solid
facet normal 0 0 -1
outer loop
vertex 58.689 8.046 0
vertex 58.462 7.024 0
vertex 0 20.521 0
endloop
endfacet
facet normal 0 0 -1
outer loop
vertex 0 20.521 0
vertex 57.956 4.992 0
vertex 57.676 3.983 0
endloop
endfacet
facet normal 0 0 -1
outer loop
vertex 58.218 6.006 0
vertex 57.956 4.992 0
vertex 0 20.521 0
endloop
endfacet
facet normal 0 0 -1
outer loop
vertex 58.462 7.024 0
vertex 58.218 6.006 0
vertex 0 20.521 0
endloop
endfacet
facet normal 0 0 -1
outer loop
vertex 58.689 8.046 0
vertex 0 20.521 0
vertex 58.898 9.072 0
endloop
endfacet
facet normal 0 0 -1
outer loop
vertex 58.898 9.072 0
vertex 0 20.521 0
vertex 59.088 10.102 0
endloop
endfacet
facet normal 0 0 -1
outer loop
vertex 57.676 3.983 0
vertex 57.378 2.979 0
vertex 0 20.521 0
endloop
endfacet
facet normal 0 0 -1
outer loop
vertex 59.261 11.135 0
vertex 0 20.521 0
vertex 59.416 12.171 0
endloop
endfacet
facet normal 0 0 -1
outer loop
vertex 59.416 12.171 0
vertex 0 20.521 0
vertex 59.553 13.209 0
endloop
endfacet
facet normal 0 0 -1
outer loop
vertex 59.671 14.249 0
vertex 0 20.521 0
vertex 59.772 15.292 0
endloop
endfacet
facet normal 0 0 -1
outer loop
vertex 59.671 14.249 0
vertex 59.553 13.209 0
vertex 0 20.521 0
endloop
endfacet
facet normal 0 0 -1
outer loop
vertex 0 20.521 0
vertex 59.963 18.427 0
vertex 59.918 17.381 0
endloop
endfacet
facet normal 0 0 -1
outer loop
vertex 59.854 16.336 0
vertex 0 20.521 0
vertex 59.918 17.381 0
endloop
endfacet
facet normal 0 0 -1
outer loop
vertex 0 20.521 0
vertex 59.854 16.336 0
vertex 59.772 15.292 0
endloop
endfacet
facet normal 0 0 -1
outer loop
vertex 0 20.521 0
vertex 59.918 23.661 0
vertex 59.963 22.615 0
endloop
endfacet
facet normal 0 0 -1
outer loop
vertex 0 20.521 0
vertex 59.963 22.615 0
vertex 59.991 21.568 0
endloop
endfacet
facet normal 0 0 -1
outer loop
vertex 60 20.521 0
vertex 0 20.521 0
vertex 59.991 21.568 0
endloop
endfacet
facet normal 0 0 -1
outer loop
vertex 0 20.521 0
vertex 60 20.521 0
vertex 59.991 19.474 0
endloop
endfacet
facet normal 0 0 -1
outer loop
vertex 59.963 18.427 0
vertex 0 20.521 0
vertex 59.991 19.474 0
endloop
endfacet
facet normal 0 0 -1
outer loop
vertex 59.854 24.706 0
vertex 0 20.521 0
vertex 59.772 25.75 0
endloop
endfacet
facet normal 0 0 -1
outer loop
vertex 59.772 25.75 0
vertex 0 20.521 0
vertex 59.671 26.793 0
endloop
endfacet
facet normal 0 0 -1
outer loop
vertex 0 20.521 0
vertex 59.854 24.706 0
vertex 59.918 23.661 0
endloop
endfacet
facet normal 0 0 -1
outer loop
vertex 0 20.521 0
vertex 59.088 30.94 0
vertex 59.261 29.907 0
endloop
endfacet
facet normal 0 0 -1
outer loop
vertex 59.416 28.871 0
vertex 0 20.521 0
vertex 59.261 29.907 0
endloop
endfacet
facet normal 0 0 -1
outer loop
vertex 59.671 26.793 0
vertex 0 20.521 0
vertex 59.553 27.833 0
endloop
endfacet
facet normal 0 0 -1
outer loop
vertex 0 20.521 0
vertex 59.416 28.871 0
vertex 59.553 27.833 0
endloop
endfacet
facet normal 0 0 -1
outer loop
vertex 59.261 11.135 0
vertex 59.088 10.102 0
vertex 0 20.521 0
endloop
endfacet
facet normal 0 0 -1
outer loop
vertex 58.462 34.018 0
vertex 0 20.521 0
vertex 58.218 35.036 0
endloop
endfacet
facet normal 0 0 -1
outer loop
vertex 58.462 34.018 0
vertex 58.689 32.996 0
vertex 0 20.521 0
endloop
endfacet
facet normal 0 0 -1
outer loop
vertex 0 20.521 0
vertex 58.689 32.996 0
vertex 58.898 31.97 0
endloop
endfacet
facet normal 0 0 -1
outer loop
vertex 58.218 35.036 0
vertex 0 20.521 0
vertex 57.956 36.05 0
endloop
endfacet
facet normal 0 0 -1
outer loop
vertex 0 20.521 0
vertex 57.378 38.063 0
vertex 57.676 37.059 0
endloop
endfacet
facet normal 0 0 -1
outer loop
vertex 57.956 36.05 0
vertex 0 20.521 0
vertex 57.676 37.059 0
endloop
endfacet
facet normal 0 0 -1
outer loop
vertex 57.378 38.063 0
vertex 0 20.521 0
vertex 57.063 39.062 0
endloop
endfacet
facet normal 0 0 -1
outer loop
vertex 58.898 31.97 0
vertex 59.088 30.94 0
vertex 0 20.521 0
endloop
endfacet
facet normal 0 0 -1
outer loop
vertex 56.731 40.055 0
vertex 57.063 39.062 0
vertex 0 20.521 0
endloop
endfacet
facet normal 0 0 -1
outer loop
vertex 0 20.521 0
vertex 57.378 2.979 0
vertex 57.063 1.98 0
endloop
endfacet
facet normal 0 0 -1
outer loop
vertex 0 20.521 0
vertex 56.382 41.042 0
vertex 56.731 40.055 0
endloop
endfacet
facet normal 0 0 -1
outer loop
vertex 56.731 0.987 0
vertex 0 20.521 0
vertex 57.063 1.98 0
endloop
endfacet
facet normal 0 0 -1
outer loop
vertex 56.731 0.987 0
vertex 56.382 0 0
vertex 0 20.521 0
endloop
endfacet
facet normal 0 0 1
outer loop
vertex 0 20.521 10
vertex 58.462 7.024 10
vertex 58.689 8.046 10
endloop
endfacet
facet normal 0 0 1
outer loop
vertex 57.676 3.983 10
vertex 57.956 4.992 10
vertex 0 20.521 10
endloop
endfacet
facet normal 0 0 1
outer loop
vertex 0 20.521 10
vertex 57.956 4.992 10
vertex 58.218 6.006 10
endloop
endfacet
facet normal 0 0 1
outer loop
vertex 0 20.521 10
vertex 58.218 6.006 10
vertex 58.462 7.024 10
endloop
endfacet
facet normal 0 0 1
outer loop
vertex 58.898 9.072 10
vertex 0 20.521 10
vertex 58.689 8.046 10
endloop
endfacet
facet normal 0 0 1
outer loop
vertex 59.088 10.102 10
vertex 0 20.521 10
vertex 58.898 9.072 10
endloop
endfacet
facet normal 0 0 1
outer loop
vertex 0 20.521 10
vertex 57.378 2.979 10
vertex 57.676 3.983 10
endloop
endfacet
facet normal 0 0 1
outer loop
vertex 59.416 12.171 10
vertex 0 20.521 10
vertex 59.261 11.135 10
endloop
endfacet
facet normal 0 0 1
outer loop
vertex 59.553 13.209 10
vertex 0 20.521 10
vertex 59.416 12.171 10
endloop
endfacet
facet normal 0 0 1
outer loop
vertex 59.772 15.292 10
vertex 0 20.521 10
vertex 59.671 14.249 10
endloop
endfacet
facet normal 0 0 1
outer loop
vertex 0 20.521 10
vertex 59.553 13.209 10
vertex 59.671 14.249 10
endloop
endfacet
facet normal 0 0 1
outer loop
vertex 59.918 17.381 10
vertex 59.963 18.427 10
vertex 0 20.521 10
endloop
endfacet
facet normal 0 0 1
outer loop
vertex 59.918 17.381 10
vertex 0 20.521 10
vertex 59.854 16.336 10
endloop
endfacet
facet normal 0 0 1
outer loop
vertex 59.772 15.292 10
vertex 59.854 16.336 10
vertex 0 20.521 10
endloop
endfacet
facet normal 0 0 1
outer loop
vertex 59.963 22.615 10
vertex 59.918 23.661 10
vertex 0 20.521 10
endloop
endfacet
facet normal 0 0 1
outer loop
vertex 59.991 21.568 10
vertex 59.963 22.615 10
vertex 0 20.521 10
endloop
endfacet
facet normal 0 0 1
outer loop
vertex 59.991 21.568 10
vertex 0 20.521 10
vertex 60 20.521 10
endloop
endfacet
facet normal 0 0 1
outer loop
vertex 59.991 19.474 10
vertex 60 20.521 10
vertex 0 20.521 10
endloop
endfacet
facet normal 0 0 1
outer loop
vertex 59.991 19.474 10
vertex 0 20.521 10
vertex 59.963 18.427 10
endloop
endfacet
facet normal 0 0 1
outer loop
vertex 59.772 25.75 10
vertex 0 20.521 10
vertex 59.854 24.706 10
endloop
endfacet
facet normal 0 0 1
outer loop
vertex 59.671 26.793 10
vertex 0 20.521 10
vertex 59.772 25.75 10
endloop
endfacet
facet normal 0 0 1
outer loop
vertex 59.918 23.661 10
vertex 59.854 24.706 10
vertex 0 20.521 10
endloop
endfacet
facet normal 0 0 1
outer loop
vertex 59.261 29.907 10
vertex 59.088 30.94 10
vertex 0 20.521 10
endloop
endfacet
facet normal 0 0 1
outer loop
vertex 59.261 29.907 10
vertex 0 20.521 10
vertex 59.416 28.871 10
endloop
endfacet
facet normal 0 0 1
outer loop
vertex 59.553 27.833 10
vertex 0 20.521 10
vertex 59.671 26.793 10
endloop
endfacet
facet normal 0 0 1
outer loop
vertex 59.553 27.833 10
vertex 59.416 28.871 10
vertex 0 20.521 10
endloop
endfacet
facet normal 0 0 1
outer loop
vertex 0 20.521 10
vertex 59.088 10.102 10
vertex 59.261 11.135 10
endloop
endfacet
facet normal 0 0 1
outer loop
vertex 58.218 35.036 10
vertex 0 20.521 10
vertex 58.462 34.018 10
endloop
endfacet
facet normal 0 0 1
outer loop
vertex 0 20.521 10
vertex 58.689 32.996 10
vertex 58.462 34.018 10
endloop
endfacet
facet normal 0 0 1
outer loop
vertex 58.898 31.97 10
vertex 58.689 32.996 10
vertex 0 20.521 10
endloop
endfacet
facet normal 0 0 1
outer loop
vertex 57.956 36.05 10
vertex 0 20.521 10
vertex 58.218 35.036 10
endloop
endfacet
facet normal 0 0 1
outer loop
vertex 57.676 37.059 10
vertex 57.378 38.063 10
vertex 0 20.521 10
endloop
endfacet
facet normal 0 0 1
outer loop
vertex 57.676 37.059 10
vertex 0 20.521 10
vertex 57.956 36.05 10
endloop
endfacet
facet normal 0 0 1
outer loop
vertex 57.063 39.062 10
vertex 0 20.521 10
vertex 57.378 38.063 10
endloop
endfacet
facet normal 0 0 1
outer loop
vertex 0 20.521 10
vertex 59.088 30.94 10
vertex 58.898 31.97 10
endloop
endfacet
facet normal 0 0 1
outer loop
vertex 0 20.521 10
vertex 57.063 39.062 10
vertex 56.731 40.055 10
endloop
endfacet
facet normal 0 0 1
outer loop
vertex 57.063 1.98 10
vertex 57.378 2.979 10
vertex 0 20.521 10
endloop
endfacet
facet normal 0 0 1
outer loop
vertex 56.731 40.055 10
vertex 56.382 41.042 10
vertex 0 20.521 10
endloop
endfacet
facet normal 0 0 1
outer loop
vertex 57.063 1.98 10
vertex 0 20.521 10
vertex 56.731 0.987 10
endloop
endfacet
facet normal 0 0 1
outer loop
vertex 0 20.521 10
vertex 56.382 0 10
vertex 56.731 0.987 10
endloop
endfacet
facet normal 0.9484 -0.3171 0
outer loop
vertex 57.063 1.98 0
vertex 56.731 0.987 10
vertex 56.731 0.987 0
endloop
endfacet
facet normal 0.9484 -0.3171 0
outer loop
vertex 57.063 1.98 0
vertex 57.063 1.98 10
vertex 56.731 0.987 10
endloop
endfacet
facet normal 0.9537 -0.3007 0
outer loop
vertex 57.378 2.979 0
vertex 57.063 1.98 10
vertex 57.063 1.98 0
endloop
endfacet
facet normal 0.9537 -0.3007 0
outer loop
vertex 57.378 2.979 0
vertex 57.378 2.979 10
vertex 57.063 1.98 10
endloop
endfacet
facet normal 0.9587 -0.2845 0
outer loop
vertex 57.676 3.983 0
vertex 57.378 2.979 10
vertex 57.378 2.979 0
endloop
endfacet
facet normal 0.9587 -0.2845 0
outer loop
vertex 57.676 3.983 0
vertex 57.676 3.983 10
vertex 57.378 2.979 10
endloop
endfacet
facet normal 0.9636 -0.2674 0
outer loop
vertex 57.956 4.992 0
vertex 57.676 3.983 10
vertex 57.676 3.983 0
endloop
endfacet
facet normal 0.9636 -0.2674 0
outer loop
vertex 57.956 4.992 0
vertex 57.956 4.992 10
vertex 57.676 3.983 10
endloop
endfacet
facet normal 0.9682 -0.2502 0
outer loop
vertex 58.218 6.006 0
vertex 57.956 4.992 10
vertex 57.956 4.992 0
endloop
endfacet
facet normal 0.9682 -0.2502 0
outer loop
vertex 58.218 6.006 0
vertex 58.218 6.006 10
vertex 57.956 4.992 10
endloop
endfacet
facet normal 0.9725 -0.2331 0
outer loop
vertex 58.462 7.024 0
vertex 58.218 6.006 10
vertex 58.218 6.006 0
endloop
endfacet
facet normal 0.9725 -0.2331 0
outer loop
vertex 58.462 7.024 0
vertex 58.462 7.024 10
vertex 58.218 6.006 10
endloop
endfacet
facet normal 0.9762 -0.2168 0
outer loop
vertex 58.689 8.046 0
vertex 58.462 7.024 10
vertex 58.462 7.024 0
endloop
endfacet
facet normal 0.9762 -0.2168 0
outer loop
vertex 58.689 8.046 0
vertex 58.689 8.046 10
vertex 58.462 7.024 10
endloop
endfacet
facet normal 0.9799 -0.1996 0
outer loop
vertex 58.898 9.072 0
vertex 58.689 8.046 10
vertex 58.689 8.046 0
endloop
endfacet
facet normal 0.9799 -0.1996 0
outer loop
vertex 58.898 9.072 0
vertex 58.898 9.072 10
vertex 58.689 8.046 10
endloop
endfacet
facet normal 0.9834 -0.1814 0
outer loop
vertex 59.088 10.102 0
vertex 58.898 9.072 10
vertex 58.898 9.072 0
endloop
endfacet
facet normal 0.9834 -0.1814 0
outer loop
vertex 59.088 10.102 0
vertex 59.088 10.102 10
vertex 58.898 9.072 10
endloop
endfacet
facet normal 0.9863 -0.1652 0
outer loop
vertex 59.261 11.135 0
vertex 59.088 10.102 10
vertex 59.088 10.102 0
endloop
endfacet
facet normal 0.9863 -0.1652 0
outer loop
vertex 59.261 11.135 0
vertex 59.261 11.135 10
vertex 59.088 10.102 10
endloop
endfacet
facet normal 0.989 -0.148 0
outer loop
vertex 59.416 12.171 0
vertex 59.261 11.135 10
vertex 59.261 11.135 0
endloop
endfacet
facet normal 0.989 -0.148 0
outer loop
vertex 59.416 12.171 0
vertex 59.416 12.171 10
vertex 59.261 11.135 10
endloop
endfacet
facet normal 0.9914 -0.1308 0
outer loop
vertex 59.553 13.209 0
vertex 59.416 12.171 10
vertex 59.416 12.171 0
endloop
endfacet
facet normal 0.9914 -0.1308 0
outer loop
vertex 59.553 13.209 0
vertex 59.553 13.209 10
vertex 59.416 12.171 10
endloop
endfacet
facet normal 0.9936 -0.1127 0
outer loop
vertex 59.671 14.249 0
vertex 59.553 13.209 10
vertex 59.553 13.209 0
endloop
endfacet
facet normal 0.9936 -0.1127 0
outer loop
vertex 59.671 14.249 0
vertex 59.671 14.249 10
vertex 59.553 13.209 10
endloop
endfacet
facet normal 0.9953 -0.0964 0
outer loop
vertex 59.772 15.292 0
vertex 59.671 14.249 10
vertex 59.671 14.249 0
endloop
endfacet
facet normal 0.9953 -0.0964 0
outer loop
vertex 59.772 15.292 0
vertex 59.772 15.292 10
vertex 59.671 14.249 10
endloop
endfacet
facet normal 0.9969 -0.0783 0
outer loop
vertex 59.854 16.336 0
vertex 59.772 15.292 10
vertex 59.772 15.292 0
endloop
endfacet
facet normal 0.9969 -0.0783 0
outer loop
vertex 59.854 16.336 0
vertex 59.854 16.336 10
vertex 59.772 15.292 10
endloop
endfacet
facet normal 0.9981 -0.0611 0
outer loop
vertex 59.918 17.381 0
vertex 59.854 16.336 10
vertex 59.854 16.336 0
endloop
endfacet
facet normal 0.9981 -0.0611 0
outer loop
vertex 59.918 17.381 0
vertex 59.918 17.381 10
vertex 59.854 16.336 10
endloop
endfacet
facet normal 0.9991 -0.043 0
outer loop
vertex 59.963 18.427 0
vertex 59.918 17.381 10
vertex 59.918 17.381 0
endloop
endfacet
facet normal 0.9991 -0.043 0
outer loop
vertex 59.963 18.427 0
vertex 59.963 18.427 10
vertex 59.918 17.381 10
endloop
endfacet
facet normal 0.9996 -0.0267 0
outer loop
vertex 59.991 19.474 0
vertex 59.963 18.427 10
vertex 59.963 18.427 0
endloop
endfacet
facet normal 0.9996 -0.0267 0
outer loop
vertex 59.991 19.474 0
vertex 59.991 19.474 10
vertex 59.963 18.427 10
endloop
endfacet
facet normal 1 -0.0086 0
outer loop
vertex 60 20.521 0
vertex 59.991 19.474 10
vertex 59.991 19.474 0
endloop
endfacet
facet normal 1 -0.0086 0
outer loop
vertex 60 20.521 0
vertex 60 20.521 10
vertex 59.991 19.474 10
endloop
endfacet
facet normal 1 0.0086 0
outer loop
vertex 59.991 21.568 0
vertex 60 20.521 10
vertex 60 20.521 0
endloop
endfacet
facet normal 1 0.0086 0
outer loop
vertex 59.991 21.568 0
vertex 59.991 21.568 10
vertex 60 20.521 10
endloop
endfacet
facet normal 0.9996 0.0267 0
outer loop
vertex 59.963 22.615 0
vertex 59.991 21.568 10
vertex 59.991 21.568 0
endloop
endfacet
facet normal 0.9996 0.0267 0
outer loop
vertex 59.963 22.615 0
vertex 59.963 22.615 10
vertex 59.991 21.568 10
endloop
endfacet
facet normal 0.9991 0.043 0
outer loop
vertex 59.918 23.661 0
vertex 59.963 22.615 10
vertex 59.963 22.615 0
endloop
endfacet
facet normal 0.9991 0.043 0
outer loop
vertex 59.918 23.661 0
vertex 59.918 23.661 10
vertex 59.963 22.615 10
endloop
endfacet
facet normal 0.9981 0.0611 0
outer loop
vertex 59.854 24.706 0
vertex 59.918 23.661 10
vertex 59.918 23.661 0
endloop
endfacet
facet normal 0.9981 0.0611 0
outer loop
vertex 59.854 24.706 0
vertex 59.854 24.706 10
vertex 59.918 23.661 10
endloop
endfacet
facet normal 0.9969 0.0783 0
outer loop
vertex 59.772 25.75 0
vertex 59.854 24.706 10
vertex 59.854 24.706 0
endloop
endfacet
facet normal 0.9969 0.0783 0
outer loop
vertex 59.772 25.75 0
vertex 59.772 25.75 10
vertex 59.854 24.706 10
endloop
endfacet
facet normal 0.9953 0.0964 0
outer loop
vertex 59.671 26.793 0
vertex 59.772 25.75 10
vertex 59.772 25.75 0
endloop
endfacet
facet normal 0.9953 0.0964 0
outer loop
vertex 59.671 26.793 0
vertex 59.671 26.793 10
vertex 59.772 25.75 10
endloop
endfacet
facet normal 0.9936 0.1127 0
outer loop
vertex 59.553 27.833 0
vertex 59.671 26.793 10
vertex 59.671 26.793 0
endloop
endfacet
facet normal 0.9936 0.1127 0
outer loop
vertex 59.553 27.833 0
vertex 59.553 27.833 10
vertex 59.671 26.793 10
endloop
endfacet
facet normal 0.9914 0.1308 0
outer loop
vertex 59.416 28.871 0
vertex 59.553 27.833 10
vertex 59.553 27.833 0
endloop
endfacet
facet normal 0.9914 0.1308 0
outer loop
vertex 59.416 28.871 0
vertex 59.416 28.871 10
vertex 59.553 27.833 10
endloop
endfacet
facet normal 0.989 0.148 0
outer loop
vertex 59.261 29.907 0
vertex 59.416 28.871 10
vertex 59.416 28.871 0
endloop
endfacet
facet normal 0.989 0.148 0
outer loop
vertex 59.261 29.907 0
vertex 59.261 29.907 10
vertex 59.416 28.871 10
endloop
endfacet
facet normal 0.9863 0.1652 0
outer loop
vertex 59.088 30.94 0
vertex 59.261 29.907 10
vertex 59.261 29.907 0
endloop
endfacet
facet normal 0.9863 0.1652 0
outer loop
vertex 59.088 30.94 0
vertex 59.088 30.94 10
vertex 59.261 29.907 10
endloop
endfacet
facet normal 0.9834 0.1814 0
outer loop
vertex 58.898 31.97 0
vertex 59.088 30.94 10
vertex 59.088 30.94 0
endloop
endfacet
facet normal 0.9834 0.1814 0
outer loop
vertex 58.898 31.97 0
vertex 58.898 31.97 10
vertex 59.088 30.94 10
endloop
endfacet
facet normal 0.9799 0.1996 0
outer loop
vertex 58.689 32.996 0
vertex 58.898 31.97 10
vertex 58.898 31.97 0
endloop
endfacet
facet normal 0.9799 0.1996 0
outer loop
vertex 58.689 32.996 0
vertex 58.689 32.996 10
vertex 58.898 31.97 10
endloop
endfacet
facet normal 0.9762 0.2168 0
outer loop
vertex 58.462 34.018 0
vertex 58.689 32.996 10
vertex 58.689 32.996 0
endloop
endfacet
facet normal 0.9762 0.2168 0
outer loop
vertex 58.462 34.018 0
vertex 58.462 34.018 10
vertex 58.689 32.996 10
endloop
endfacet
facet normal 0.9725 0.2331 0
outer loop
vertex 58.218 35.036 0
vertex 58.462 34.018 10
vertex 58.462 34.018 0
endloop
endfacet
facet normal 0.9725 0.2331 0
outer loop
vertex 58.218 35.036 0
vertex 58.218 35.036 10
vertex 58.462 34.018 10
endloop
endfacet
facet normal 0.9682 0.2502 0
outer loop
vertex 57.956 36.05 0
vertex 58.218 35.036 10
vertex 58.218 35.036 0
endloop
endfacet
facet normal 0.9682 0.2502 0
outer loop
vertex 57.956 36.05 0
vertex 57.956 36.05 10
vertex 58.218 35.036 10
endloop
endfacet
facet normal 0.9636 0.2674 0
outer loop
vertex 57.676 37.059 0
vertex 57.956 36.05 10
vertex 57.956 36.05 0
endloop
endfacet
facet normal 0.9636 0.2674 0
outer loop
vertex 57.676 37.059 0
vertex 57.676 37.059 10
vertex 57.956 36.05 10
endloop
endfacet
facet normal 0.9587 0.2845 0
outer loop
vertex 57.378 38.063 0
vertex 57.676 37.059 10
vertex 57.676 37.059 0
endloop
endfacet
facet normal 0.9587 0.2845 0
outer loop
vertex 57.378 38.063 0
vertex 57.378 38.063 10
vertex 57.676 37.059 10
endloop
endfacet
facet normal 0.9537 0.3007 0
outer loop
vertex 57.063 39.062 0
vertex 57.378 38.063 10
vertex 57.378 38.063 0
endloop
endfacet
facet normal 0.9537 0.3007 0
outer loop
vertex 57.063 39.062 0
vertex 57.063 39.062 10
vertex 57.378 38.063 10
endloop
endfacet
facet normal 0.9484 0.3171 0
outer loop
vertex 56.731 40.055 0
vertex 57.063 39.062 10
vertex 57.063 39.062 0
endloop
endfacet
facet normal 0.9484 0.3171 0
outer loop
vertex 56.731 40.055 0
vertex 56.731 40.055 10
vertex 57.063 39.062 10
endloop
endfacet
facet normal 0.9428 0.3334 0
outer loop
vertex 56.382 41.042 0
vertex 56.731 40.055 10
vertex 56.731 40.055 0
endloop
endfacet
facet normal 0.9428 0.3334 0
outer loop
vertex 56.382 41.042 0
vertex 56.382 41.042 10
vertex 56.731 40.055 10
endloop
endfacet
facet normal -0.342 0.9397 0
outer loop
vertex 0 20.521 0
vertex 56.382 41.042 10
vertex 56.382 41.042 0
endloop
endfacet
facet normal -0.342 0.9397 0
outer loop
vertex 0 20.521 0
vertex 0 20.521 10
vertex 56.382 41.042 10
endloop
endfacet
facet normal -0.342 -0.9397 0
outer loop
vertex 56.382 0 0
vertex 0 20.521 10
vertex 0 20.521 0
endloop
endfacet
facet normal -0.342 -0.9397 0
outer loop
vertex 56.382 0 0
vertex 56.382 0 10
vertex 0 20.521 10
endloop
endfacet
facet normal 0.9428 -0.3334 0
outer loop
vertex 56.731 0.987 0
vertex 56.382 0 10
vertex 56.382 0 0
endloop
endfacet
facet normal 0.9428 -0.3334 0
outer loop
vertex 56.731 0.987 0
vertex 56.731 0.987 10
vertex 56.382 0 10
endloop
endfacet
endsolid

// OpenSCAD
$fn = 32;

// ----------------------------------------------------------------------
// Arc profile plate: sector, 42 points
// ----------------------------------------------------------------------

// --- parameters (mm) ---
sector_angle = 40;        // sector angle, degrees
sector_r = 60;            // outer radius
arc_step = 1;             // sampling step of the arc, degrees
plate_t = 10;             // plate thickness, Z
fit_tol = 0.1;            // declared fit tolerance (prompt contract)
free_tol = 0.3;           // declared free tolerance (prompt contract)

bbox_x = 2 * sector_r * sin(sector_angle / 2);  // chord of the sector
bbox_y = sector_r;  // depth of the sector (apex to arc)

profile = [[56.382, 0], [56.731, 0.987], [57.063, 1.98], [57.378, 2.979], [57.676, 3.983], [57.956, 4.992], [58.218, 6.006], [58.462, 7.024], [58.689, 8.046], [58.898, 9.072], [59.088, 10.102], [59.261, 11.135], [59.416, 12.171], [59.553, 13.209], [59.671, 14.249], [59.772, 15.292], [59.854, 16.336], [59.918, 17.381], [59.963, 18.427], [59.991, 19.474], [60, 20.521], [59.991, 21.568], [59.963, 22.615], [59.918, 23.661], [59.854, 24.706], [59.772, 25.75], [59.671, 26.793], [59.553, 27.833], [59.416, 28.871], [59.261, 29.907], [59.088, 30.94], [58.898, 31.97], [58.689, 32.996], [58.462, 34.018], [58.218, 35.036], [57.956, 36.05], [57.676, 37.059], [57.378, 38.063], [57.063, 39.062], [56.731, 40.055], [56.382, 41.042], [0, 20.521]];  // primary outline, 42 points, counter clockwise

// --- the one profile operation ---
linear_extrude(height = plate_t) polygon(points = profile);
